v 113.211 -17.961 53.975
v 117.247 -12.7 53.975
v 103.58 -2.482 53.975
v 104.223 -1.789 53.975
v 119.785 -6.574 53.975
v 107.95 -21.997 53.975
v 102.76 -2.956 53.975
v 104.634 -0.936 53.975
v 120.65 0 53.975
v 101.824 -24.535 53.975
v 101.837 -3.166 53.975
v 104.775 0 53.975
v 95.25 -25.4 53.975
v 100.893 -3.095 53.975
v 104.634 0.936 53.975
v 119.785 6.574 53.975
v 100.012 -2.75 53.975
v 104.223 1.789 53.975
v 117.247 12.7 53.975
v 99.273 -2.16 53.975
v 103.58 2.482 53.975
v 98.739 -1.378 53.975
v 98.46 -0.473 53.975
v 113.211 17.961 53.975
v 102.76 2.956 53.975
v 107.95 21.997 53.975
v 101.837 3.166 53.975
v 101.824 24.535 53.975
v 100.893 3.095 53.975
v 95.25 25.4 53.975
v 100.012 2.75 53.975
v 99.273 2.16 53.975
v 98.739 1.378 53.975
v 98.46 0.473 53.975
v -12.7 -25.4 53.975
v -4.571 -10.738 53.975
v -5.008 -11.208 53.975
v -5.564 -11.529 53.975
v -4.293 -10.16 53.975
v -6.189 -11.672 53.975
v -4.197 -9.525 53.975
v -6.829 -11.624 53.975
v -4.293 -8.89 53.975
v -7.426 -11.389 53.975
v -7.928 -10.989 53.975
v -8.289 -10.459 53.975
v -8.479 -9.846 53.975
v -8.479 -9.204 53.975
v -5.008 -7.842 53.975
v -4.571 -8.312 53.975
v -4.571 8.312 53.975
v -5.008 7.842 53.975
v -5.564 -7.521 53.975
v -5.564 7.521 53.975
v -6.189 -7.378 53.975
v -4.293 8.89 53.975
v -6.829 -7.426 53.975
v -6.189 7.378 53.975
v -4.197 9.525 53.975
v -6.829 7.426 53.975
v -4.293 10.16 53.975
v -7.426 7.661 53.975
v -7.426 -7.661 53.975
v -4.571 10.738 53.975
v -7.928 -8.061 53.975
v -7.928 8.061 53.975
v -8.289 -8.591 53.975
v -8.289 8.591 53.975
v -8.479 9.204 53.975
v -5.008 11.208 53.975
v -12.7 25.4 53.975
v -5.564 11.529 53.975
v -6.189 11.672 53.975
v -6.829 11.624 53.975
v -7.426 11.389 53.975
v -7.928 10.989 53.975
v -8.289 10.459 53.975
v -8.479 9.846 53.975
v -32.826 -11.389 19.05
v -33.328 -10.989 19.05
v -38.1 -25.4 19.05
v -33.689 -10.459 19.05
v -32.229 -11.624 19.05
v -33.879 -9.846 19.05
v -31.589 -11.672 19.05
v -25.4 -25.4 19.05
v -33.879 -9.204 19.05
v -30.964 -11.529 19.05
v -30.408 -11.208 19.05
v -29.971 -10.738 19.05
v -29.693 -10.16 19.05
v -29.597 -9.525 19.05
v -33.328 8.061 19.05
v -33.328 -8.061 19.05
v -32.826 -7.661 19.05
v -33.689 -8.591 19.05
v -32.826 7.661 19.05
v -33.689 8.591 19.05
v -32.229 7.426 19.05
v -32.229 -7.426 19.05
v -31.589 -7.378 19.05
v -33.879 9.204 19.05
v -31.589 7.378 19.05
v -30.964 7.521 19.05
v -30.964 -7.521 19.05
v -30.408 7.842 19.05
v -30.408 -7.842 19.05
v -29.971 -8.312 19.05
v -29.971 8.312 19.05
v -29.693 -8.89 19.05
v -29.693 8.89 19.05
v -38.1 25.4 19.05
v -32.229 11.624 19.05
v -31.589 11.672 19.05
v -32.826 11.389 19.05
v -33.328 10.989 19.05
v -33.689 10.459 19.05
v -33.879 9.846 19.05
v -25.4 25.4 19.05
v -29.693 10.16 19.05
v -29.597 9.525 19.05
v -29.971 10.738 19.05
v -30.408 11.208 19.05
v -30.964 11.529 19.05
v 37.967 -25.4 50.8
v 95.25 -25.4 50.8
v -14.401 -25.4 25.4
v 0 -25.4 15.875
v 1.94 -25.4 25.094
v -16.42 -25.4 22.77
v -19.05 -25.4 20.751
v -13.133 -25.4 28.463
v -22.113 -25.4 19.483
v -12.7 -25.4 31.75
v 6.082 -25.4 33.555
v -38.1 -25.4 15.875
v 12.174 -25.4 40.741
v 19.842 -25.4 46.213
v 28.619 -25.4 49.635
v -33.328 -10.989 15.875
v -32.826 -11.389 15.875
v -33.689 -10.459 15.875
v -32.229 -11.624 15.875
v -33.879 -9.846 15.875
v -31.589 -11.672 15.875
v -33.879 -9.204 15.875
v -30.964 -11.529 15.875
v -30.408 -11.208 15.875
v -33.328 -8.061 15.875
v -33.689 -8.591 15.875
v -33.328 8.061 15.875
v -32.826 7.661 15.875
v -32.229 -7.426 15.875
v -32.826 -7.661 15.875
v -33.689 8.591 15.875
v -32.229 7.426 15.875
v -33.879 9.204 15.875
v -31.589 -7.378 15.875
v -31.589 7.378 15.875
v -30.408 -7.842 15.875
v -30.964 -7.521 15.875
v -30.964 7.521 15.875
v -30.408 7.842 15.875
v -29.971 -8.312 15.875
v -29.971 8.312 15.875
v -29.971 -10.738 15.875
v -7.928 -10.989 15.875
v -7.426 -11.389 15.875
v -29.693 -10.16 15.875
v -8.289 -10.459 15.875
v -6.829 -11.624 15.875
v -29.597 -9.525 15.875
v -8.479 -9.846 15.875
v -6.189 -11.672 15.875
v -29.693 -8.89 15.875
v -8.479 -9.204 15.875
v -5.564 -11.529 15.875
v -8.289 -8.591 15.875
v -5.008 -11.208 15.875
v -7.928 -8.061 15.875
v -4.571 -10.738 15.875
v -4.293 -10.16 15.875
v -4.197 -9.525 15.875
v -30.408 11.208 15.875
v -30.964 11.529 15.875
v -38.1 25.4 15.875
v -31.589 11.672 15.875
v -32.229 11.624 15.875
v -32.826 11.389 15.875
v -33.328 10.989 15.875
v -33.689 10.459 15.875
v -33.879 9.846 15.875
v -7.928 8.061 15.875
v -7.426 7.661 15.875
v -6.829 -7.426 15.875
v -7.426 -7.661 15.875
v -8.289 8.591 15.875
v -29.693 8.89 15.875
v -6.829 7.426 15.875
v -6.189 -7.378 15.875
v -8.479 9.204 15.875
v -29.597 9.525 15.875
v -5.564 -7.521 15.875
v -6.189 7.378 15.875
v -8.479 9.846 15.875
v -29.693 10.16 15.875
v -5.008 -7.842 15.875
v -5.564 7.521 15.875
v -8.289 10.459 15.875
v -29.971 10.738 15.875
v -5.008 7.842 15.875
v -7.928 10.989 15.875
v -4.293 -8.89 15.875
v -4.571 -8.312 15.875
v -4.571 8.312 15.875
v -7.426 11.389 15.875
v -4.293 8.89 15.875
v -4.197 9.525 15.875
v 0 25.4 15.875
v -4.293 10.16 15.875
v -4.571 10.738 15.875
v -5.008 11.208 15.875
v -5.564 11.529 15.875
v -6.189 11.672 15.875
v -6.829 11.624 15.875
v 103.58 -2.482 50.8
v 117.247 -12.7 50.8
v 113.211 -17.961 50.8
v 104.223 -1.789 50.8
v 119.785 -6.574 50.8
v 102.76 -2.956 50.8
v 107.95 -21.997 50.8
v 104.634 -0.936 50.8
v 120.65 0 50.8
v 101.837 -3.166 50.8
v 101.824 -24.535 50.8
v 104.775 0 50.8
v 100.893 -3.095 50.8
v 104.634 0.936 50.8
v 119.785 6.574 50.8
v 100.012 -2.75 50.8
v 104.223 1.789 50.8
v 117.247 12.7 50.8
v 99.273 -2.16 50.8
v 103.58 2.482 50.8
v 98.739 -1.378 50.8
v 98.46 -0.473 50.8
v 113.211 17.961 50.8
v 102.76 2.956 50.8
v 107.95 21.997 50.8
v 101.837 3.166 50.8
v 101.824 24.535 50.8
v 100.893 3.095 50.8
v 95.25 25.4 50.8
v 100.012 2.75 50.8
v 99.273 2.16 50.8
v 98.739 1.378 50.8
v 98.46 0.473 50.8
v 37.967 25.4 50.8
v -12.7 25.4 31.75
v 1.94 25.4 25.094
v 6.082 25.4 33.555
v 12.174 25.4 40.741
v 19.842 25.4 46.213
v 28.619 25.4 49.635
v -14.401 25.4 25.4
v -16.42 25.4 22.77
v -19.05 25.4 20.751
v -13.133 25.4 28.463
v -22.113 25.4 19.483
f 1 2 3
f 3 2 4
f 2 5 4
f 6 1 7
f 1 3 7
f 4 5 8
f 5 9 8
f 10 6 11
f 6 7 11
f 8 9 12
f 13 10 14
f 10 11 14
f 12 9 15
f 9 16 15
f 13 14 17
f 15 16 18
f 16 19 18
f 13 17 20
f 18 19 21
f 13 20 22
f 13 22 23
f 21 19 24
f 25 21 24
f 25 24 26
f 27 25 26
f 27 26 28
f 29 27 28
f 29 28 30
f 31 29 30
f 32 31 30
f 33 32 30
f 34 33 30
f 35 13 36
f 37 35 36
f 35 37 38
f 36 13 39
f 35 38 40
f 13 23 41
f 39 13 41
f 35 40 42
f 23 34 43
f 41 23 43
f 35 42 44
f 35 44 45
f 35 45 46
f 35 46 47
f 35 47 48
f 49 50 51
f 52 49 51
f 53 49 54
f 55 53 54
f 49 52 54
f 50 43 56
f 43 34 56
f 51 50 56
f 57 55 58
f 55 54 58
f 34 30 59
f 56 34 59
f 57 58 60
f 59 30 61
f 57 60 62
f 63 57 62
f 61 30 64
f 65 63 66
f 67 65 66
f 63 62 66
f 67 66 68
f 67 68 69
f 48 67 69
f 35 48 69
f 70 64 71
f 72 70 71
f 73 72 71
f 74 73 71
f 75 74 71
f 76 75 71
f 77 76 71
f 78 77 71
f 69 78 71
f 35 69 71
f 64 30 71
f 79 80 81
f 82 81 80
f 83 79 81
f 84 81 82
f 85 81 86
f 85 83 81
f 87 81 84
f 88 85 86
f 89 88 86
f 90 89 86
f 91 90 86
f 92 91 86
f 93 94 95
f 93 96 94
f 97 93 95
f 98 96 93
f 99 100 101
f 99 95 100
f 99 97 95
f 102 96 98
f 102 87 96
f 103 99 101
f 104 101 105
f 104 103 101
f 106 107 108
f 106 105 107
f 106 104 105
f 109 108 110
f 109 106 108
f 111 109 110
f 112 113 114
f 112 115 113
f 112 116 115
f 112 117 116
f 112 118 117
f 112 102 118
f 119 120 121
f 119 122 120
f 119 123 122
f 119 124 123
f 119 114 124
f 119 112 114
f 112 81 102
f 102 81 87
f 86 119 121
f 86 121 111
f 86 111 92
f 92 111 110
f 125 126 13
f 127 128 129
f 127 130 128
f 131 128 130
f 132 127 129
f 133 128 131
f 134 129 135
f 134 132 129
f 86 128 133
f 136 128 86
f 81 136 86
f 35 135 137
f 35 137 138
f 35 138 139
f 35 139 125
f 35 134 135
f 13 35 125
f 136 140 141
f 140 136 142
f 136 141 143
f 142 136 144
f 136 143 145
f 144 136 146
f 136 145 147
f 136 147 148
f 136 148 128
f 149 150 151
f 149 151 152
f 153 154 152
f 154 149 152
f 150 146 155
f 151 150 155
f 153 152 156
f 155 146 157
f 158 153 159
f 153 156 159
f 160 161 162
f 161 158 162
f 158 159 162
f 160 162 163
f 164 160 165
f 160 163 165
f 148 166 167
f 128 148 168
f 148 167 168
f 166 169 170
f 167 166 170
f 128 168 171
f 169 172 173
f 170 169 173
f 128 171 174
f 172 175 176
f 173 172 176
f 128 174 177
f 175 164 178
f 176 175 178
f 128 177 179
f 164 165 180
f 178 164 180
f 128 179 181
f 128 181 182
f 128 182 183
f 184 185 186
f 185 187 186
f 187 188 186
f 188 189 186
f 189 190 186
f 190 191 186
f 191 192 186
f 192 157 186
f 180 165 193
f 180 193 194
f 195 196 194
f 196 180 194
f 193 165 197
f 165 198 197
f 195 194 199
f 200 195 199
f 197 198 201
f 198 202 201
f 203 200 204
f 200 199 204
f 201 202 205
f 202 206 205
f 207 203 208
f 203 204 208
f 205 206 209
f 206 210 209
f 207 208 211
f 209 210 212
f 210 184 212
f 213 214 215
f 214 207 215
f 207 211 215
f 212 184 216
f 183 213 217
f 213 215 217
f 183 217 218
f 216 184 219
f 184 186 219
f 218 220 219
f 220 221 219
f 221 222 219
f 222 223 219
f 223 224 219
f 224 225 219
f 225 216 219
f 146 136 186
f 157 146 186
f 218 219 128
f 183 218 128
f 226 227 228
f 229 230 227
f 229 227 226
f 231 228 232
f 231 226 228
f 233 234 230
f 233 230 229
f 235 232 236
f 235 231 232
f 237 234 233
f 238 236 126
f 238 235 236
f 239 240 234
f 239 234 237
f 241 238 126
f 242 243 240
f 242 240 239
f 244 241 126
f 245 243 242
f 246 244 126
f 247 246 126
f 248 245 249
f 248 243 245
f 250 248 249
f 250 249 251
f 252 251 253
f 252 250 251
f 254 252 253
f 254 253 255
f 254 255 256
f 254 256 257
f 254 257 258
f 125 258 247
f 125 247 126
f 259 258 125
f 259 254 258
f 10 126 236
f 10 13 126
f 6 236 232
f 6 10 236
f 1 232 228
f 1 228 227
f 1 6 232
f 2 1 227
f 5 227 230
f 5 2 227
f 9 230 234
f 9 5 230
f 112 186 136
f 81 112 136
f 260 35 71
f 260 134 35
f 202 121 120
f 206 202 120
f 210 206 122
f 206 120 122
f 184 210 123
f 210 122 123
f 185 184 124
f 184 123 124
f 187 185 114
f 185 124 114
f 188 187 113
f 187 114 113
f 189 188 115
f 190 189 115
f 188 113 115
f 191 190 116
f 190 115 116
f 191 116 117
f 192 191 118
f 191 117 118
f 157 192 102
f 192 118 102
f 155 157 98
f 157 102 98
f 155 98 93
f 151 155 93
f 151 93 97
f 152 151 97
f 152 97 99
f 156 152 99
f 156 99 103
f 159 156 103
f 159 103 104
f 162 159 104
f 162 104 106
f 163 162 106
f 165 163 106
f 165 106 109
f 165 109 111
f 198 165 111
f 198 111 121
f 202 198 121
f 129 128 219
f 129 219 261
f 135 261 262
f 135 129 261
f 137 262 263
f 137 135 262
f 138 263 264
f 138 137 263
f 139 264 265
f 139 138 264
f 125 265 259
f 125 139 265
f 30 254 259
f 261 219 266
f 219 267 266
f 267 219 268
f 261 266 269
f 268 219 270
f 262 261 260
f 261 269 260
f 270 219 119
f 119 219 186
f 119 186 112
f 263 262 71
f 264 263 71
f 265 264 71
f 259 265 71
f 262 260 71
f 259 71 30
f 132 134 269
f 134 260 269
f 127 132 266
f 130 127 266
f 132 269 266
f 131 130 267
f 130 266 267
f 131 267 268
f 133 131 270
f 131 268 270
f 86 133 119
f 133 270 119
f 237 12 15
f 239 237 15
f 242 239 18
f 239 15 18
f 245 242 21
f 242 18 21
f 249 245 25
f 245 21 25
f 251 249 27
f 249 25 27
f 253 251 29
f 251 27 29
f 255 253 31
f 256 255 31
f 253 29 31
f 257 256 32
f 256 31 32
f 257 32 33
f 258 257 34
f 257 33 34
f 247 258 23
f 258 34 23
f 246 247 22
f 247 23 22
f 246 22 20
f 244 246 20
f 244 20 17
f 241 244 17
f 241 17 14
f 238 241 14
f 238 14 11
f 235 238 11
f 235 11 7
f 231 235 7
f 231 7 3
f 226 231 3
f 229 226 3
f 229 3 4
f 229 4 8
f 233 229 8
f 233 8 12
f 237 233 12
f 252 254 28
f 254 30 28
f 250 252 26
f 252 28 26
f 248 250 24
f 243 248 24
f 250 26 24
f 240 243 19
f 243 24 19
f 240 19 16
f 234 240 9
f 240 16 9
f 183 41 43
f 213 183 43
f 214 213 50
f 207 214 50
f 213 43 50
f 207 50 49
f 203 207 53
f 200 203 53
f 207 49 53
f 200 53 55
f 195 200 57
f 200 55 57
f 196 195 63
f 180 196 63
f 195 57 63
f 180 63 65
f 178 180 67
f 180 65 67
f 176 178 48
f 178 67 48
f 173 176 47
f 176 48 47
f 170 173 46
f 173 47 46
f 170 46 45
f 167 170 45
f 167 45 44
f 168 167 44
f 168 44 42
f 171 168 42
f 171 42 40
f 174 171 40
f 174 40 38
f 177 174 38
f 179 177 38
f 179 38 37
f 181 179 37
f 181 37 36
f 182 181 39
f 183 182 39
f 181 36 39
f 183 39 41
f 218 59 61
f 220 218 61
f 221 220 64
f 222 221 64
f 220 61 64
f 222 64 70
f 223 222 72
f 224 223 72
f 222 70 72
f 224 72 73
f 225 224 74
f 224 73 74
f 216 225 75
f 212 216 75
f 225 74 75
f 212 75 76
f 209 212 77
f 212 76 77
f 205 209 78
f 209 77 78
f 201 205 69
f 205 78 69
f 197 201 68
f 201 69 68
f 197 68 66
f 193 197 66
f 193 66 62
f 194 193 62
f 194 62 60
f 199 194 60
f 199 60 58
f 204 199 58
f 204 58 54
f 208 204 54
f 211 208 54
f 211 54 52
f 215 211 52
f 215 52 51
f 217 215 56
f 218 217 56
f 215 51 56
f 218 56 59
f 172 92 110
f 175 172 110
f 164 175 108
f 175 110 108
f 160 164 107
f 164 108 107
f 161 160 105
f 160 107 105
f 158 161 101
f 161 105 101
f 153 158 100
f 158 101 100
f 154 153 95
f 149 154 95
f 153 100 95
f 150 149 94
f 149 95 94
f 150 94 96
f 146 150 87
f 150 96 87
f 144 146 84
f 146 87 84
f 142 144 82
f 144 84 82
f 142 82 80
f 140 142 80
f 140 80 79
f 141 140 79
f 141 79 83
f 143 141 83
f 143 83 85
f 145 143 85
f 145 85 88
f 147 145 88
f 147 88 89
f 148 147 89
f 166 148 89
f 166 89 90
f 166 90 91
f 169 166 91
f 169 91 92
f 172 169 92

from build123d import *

# Parameters (mm, degrees)
BOSS_EXTRUDE1_DEPTH = 3.175
SKETCH2_W           = 12.7
SKETCH2_H           = 50.8
BOSS_EXTRUDE2_DEPTH = 31.75
FILLET1_R           = 12.7
BOSS_EXTRUDE3_DEPTH = 3.175
FILLET2_R           = 38.1
SKETCH4_R           = 2.15265
CUT_EXTRUDE1_DEPTH  = 38.1
FILLET3_R           = 25.4
CUT_EXTRUDE4_REACH  = 131.047
SKETCH7_R           = 3.175


# Some blends are built 0.0001 mm under size
with BuildPart() as part:
    # Sketch1 → Boss-Extrude1 (new body)
    with BuildSketch(Plane.XY.offset(15.875)):
        Polygon((-38.1, 25.4), (-38.1, -25.4), (-25.4, -25.4), (0, -25.4), (0, 25.4), align=None)
    extrude(amount=BOSS_EXTRUDE1_DEPTH)

    # Sketch2 → Boss-Extrude2 (add)
    with BuildSketch(Plane.XY.offset(50.8)):
        with Locations((-6.35, 0)):
            Rectangle(SKETCH2_W, SKETCH2_H)
    extrude(amount=-BOSS_EXTRUDE2_DEPTH)

    # Fillet1
    fillet1_edges = [part.edges().sort_by_distance(p)[0] for p in [
        (-12.7, 0, 19.05),
    ]]
    fillet(fillet1_edges, radius=FILLET1_R)

    # Sketch3 → Boss-Extrude3 (add)
    with BuildSketch(Plane.XY.offset(50.8)):
        Polygon((0, 25.4), (101.6, 25.4), (120.65, 25.4), (120.65, -25.4), (0, -25.4), (-12.7, -25.4), (-12.7, 25.4), align=None)
    extrude(amount=BOSS_EXTRUDE3_DEPTH)

    # Fillet2
    # the kernel refuses this fillet: 38.1 mm, written as the material it adds along each edge
    with BuildSketch(Plane(origin=(0, -25.4, 50.8), x_dir=(0, 0, -1), z_dir=(0, 1, 0))) as fillet2_piece_1:
        with BuildLine():
            CenterArc((38.1, -37.967477859), FILLET2_R, 94.780191847, 85.219808153)
            Line((0, -37.967477859), (-0.762, -37.967477859))
            Line((-0.762, -37.967477859), (-0.762, 0))
            Line((-0.762, 0), (0, 0.762))
            ThreePointArc((0, 0.762), (17.4625, 0.762), (34.8615, 0.759349557))
            Line((34.8615, 0.759349557), (34.925, 0))
        make_face()
    extrude(amount=50.8)

    # Sketch4 → Cut-Extrude1 (cut)
    with BuildSketch(Plane.XY.offset(53.975)):
        with Locations((-6.35, 9.525)):
            Circle(SKETCH4_R)
        with Locations((-31.75, 9.525)):
            Circle(SKETCH4_R)
        with Locations((-6.35, -9.525)):
            Circle(SKETCH4_R)
        with Locations((-31.75, -9.525)):
            Circle(SKETCH4_R)
    extrude(amount=-CUT_EXTRUDE1_DEPTH, mode=Mode.SUBTRACT)

    # Fillet3
    fillet3_edges = [part.edges().sort_by_distance(p)[0] for p in [
        (120.65, -25.4, 52.3875),
        (120.65, 25.4, 52.3875),
    ]]
    fillet(fillet3_edges, radius=FILLET3_R - 0.0001)  # a hair under: the kernel refuses the full size

    # Sketch7 → Cut-Extrude4 (cut, up to next)
    with BuildSketch(Plane.XY.offset(53.975), mode=Mode.PRIVATE) as cut_extrude4_sk1:
        with Locations((101.6, 0)):
            Circle(SKETCH7_R)
    cut_extrude4_tool1 = extrude(cut_extrude4_sk1.sketch, amount=-CUT_EXTRUDE4_REACH, mode=Mode.PRIVATE) & part.part
    add(cut_extrude4_tool1.solids().sort_by_distance((101.6, 0, 53.975))[0], mode=Mode.SUBTRACT)


solid = part.part
